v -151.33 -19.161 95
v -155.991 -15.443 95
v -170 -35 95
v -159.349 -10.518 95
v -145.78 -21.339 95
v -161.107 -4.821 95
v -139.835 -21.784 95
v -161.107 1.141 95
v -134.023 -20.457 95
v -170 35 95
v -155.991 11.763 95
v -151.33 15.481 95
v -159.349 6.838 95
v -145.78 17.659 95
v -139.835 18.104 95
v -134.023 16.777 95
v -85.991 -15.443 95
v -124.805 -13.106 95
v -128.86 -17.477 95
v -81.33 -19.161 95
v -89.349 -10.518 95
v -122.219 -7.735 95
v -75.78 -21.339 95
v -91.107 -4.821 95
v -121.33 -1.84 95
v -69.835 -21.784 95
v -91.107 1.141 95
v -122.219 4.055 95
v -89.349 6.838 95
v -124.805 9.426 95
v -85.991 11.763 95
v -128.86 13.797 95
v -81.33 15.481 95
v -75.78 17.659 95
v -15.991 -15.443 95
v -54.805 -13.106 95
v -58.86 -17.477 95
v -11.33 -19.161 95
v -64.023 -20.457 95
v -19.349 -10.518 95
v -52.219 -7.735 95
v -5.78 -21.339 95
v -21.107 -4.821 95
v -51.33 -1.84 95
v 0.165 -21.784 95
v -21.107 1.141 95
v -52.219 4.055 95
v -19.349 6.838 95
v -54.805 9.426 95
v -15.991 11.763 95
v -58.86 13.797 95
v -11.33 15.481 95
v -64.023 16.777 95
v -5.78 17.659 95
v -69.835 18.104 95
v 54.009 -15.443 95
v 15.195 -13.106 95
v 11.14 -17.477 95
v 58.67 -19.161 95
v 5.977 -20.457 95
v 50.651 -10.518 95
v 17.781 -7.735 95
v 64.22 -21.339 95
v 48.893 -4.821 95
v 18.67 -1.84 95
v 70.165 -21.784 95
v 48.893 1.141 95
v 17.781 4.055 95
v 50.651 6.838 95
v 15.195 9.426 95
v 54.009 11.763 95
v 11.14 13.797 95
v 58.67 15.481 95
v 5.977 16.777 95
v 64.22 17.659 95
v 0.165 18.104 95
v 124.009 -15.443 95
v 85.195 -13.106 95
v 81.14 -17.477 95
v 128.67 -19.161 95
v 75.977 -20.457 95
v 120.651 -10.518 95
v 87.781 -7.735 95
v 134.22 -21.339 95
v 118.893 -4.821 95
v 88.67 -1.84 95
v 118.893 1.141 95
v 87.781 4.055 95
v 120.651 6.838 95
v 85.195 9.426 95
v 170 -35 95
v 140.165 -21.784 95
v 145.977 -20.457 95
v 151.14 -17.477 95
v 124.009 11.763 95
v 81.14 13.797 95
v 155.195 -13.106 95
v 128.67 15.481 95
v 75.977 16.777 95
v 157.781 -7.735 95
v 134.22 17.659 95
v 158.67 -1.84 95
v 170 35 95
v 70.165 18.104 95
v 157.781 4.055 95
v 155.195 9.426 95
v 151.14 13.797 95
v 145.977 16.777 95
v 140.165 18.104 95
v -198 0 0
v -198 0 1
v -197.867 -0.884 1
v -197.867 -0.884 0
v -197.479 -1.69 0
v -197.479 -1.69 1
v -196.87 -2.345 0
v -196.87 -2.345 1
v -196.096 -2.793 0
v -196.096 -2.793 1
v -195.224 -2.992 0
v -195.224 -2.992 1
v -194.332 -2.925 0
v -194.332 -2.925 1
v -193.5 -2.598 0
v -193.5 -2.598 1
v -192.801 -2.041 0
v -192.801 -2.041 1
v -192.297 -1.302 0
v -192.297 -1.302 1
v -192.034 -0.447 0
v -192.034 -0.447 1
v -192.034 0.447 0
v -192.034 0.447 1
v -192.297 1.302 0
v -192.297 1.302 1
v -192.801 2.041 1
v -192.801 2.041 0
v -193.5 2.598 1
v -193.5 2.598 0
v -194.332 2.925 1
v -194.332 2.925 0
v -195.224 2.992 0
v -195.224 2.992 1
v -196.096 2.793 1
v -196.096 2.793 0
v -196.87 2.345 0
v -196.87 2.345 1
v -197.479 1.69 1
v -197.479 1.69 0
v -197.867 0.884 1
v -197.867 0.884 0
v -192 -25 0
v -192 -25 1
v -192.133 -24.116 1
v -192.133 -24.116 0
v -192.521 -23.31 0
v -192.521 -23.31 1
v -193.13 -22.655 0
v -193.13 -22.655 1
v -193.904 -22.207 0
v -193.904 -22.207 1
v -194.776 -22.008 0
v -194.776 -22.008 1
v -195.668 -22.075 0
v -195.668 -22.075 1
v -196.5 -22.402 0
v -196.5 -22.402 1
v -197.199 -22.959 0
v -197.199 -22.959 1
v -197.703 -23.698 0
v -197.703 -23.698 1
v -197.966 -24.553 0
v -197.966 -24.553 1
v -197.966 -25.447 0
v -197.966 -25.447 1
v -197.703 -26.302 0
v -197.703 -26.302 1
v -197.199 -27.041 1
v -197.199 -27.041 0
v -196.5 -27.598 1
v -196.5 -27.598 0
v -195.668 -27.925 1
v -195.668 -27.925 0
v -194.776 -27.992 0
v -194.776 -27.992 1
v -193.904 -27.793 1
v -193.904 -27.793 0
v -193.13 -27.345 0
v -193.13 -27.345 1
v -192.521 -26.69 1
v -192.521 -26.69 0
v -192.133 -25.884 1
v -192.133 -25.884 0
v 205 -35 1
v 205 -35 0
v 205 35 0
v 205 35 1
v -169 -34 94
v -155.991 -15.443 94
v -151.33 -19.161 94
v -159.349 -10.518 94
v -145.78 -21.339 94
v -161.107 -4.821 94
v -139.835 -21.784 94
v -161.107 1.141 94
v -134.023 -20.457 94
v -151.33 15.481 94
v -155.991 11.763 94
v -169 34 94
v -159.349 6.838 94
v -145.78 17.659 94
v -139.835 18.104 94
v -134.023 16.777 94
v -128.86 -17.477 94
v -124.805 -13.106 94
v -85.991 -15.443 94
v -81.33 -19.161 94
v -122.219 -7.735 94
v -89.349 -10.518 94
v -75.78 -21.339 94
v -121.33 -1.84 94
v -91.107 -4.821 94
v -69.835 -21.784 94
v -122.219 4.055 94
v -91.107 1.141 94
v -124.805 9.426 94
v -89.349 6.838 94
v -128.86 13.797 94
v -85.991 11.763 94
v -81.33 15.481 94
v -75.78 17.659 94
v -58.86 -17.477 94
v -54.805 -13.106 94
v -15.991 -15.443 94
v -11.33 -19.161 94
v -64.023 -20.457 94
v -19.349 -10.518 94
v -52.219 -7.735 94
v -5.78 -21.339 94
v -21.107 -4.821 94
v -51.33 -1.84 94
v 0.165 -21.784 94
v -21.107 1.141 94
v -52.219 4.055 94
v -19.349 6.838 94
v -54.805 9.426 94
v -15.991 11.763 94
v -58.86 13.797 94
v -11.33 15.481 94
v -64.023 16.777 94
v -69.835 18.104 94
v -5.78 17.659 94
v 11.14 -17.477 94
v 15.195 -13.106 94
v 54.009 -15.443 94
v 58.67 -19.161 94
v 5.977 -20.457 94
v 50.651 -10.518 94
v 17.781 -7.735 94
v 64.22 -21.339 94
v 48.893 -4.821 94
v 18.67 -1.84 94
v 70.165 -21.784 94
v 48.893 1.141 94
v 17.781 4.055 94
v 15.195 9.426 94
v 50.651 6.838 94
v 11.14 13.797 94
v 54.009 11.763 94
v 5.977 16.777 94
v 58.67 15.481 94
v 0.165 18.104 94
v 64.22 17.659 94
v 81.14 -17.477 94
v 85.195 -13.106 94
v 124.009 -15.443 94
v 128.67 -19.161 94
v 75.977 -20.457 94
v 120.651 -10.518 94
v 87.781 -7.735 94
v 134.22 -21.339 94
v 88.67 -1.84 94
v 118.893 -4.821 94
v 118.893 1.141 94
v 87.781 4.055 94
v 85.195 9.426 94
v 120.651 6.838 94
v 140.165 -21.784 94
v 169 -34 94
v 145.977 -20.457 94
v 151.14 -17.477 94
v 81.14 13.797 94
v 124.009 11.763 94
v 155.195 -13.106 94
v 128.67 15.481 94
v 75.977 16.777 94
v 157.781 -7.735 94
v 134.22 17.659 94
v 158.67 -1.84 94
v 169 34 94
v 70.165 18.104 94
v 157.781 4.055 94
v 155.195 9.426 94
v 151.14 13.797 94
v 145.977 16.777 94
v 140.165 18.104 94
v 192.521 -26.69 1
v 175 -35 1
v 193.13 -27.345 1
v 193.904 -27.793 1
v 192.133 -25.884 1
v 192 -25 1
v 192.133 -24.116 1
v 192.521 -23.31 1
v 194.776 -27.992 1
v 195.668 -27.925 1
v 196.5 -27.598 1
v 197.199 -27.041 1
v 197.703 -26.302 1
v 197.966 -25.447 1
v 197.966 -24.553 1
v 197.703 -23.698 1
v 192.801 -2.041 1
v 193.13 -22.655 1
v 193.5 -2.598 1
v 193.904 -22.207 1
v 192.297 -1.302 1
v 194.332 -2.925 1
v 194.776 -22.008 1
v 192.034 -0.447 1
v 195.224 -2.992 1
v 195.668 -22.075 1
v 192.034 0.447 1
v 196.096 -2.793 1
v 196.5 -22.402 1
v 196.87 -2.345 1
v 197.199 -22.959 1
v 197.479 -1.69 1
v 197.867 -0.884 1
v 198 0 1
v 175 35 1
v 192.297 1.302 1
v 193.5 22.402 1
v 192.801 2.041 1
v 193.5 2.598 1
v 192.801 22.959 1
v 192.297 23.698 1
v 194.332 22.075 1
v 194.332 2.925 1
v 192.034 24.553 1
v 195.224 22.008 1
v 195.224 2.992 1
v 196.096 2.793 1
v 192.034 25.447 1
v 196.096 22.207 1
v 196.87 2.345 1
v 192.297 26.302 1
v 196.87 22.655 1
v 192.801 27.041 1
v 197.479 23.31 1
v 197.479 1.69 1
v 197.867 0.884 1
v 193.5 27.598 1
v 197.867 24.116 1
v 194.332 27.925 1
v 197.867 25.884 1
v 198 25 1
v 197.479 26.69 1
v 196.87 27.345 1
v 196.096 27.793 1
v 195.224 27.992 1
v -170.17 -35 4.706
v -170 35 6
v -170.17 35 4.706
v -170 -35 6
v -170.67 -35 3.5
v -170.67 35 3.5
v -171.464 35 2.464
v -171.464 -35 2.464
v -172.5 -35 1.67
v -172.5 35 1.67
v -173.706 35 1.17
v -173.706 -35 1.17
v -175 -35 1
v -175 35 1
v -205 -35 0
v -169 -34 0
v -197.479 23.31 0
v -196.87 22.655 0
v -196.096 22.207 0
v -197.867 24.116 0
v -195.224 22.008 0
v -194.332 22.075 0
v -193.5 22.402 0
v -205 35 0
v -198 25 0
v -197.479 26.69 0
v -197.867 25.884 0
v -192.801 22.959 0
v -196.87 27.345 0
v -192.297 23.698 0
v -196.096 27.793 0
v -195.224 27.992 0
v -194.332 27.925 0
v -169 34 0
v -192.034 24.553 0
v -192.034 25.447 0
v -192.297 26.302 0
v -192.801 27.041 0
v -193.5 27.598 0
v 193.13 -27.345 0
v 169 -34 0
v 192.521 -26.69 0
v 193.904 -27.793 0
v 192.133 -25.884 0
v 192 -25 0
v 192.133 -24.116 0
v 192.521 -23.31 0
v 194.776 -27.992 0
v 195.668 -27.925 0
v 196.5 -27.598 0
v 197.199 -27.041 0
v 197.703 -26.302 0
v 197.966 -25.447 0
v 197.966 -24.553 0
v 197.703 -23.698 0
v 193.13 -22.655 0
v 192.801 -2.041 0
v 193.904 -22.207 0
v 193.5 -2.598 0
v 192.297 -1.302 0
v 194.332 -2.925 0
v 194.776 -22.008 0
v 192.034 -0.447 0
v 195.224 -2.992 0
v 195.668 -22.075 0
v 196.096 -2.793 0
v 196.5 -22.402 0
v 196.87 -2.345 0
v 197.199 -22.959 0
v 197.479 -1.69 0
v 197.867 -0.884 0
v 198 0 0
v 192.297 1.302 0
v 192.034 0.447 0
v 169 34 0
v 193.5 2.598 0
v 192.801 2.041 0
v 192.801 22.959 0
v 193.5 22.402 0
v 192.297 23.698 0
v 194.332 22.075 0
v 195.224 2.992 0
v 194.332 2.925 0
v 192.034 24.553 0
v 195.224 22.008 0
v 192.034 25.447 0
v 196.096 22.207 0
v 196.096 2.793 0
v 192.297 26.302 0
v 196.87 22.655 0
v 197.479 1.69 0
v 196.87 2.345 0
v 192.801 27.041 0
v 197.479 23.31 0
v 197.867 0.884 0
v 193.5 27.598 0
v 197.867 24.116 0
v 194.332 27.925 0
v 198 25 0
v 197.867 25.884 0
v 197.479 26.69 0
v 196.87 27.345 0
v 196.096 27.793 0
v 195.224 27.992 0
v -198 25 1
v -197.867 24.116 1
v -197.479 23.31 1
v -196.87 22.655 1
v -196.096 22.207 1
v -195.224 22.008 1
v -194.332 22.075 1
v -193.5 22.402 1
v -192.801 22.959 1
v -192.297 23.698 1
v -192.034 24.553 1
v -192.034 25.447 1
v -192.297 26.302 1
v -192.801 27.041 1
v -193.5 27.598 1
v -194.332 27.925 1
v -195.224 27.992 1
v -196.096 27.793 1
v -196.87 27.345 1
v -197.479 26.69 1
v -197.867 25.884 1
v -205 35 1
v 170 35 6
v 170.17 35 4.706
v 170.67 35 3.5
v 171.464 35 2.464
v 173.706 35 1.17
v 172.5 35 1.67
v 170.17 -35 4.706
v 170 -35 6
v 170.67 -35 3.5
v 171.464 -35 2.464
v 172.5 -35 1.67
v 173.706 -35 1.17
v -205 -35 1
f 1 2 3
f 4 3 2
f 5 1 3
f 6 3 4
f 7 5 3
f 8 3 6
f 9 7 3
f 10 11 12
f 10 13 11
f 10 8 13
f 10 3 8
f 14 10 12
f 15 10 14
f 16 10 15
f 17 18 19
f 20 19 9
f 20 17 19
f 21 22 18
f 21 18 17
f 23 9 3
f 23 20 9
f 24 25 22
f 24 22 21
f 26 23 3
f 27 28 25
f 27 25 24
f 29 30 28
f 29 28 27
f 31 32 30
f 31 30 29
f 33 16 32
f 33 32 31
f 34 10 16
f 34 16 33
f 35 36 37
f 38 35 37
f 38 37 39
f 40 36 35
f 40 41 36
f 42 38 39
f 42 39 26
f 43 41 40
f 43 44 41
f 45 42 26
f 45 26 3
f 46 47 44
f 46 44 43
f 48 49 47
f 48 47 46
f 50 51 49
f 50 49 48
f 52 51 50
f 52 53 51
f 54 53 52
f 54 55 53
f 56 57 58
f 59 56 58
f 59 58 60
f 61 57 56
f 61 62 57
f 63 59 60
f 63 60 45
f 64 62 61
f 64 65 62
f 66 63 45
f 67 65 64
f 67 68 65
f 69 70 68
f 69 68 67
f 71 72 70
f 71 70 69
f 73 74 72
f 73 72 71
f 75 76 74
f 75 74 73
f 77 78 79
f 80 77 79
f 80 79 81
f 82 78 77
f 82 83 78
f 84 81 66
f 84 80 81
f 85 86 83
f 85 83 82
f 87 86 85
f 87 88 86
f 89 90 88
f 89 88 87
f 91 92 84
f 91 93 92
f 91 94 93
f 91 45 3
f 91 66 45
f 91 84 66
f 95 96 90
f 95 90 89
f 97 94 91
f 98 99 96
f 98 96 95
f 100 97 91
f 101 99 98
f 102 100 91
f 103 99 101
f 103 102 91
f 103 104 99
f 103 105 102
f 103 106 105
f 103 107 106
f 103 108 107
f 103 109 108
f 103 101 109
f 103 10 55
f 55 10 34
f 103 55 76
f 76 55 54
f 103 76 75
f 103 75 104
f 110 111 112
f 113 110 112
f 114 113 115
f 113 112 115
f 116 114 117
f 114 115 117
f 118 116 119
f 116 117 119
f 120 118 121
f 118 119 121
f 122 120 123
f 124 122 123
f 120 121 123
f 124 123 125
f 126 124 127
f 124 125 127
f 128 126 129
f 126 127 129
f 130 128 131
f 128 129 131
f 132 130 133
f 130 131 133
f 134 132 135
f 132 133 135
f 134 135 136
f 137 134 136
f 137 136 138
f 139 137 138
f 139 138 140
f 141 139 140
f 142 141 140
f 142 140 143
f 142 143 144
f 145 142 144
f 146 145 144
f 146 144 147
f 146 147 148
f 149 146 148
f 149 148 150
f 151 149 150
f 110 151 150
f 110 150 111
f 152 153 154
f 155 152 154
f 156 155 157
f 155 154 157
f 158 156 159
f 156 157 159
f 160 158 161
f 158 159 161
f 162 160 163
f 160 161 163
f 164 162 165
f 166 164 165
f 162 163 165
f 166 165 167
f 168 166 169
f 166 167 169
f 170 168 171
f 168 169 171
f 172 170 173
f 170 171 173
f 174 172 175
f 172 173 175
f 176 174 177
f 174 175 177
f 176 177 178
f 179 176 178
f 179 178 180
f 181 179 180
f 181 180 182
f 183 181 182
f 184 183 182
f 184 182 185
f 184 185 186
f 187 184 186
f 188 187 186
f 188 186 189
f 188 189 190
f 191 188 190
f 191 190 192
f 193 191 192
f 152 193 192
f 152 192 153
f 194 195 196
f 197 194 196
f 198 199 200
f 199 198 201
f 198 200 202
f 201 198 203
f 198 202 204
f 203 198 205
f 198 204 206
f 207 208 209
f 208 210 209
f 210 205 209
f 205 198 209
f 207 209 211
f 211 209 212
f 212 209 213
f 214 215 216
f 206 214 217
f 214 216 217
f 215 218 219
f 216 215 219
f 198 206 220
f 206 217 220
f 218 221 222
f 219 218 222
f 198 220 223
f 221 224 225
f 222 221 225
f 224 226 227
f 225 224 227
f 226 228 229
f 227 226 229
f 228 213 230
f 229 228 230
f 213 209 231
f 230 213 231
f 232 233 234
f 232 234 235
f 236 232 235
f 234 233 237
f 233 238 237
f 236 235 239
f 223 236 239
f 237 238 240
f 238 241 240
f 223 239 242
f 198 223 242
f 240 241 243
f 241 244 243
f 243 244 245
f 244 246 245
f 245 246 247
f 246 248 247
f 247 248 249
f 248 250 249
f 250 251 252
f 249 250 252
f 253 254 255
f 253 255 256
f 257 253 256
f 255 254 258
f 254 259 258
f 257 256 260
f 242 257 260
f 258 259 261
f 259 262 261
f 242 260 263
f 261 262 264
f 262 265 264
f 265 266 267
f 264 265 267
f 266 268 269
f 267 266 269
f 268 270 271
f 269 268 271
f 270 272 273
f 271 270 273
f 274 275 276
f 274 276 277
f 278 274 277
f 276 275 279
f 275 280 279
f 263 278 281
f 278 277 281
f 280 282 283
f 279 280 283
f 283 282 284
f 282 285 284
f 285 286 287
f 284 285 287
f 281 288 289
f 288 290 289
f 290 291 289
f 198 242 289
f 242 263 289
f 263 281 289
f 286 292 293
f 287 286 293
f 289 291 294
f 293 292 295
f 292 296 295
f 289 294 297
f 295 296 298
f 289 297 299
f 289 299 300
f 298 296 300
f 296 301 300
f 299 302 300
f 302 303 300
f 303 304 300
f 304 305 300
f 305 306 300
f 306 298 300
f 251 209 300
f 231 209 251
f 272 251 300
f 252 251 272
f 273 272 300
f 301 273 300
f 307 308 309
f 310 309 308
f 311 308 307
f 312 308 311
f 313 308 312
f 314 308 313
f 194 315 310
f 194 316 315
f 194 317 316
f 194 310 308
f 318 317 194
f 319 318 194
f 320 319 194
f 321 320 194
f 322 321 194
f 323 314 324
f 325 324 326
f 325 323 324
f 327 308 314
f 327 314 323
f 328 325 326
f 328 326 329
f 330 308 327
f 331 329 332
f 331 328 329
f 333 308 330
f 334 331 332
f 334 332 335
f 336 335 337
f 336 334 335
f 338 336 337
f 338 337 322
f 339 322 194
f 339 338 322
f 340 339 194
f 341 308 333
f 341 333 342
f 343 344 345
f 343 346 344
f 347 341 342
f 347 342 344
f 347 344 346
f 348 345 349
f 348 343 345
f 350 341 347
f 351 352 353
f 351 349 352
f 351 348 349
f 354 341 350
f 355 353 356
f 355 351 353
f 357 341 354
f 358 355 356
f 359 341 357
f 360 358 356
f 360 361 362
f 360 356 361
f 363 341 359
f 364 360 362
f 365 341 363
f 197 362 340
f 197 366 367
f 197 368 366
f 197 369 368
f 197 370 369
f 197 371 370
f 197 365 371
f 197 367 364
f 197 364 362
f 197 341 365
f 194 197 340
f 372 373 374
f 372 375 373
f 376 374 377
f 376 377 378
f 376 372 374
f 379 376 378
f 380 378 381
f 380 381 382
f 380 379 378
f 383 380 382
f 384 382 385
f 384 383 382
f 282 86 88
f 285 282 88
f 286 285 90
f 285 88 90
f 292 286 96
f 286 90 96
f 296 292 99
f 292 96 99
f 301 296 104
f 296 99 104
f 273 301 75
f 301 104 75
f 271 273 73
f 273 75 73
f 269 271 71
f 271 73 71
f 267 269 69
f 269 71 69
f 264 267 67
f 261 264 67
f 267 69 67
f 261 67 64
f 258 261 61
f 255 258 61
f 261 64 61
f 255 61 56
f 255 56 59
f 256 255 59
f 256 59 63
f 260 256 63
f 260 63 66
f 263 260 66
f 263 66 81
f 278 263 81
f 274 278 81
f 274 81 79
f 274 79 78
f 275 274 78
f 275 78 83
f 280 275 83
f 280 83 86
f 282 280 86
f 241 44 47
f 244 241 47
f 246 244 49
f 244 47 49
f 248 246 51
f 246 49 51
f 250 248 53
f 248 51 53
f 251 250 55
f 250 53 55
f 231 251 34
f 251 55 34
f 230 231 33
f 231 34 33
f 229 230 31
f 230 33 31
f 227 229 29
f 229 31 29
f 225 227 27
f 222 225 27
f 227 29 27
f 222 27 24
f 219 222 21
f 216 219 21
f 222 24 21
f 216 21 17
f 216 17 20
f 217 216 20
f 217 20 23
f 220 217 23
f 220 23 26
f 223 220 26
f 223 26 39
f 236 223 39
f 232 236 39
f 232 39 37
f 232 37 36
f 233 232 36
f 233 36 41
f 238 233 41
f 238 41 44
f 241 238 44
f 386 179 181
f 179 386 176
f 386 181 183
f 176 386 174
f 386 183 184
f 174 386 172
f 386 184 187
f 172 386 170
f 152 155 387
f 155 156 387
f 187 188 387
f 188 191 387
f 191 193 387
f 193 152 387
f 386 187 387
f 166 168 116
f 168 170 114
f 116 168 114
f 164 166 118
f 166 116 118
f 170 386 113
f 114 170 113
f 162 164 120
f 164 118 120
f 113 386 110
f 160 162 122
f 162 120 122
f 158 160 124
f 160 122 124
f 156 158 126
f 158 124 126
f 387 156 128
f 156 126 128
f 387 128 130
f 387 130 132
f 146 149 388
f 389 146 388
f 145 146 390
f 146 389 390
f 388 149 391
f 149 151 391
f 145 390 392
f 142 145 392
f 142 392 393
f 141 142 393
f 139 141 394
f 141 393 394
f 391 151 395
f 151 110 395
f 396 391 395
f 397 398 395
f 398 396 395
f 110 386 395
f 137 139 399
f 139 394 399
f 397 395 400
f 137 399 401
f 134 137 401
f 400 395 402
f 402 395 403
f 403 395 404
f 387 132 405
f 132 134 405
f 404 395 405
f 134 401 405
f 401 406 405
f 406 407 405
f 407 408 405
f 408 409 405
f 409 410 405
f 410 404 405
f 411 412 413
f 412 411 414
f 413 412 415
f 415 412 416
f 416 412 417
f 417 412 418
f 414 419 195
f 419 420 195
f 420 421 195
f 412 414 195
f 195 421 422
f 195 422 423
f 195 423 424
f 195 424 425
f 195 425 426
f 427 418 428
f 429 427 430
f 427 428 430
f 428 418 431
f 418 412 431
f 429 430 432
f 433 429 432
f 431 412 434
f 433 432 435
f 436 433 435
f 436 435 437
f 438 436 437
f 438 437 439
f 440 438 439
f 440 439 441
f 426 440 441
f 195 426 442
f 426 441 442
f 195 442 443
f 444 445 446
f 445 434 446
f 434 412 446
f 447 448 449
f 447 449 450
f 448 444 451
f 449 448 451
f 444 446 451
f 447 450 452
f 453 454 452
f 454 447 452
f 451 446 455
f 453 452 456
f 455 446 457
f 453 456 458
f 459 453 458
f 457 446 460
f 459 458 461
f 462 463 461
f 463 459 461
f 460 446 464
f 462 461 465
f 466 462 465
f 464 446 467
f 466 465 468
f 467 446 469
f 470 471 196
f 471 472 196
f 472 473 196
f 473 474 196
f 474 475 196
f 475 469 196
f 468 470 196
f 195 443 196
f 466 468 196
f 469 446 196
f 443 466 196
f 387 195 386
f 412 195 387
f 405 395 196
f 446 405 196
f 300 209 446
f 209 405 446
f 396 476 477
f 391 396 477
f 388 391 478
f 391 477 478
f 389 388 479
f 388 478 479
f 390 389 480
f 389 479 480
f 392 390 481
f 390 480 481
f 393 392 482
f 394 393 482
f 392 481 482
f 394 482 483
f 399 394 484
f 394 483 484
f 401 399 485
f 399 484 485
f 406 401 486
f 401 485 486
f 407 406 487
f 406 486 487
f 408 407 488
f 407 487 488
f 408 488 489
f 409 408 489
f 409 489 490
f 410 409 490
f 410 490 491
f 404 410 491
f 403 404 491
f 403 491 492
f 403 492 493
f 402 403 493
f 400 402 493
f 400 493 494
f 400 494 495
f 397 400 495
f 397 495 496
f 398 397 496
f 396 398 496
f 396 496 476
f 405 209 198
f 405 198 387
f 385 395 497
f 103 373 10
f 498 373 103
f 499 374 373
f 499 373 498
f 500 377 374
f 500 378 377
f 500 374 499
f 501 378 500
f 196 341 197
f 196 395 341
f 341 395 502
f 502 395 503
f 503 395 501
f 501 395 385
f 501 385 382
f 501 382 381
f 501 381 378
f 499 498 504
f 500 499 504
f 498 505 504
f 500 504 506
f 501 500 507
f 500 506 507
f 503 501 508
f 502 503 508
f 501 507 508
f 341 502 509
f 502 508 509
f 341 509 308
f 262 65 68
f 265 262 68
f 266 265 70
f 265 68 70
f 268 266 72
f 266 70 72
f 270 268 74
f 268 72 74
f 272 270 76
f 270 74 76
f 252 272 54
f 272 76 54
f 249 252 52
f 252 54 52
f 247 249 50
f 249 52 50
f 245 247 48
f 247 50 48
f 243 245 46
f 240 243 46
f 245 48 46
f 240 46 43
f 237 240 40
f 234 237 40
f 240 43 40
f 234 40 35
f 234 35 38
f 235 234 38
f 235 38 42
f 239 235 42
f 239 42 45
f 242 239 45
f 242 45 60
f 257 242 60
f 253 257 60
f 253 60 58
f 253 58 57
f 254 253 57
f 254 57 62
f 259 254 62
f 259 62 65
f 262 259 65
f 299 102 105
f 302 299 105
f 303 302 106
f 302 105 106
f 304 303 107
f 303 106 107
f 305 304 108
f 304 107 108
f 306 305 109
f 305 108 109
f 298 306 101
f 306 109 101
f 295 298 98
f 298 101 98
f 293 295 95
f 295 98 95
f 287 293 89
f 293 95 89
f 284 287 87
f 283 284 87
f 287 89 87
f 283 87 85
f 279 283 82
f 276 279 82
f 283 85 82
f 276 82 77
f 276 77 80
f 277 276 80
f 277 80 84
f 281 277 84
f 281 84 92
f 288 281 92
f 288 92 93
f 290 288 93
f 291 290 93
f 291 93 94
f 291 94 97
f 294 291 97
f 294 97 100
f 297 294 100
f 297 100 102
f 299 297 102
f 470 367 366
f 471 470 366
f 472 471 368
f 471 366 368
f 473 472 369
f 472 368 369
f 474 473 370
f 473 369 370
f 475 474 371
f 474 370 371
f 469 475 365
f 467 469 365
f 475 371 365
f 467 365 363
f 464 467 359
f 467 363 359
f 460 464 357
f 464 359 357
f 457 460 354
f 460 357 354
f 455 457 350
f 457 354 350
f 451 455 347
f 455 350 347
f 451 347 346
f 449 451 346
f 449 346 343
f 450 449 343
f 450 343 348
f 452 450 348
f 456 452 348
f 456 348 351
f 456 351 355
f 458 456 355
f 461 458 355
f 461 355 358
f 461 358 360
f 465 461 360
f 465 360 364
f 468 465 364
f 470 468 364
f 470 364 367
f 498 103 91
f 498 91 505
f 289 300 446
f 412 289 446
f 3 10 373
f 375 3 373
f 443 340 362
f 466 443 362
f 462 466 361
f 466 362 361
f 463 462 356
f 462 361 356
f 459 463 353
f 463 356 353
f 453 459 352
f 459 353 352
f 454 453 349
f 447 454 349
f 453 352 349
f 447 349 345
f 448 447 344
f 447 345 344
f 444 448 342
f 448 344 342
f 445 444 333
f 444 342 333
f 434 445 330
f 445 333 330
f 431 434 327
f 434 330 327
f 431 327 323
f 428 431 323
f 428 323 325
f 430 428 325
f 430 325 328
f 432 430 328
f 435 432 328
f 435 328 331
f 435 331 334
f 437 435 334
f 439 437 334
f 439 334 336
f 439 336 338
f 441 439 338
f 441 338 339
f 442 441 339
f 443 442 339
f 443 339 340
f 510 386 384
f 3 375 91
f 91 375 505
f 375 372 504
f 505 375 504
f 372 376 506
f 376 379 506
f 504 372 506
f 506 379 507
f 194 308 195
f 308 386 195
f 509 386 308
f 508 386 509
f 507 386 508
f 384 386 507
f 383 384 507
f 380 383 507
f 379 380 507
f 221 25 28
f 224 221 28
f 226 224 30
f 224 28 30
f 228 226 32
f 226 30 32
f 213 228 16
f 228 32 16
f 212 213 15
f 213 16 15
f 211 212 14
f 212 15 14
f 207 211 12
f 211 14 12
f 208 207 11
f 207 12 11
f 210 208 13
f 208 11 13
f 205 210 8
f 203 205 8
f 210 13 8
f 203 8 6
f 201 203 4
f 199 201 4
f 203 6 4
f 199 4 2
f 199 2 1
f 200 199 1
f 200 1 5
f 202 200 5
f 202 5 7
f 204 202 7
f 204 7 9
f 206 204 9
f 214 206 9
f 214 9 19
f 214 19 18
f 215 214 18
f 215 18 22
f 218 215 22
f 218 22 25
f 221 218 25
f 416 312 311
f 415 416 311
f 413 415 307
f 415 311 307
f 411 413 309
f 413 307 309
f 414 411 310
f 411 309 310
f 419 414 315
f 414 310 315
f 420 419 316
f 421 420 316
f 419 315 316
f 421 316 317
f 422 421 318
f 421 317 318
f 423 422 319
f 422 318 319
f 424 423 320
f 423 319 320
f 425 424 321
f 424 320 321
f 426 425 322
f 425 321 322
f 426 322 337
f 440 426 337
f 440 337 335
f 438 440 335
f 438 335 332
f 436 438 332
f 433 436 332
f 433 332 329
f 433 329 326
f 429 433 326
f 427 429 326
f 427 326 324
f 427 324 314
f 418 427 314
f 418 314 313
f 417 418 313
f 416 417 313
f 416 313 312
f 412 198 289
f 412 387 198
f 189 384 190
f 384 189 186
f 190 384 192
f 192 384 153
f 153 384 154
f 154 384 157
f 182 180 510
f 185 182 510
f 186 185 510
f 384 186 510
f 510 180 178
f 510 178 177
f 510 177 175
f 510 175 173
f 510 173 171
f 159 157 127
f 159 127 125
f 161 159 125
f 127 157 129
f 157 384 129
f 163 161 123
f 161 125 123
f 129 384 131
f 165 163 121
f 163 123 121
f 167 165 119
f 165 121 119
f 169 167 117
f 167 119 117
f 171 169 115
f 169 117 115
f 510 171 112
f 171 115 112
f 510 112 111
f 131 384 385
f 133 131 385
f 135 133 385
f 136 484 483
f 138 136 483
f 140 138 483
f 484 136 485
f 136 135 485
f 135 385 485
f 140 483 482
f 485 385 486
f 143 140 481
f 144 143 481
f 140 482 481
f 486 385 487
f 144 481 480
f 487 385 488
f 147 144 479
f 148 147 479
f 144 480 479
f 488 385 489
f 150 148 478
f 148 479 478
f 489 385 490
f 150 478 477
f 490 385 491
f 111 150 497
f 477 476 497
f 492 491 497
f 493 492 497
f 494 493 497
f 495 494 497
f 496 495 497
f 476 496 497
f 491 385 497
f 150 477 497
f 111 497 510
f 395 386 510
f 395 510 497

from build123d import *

# Parameters (mm, degrees)
SKETCH_1_W          = 410
SKETCH_1_H          = 70
EXTRUDE_1_DEPTH     = 95
SKETCH_2_W          = 35
SKETCH_2_H          = 94
CUT_EXTRUDE_1_DEPTH = 95
SHELL_1_T           = -1
FILLET_2_R          = 5
SKETCH_3_R          = 2.9999999999999947
SKETCH_3_R_2        = 2.999999999999994
SKETCH_3_R_3        = 3.000000000000047
CUT_EXTRUDE_2_DEPTH = 229.22357459298556
SKETCH_4_R          = 20.000000000000004
SKETCH_4_R_2        = 20
SKETCH_4_R_3        = 19.999999999999986
CUT_EXTRUDE_3_DEPTH = 229.63726730347355


with BuildPart() as part:
    # 草图1 → 凸台-拉伸1 (new body)
    with BuildSketch(Plane.XY):
        Rectangle(SKETCH_1_W, SKETCH_1_H)
    extrude(amount=EXTRUDE_1_DEPTH)

    # 草图2 → 切除-拉伸1 (cut)
    with BuildSketch(Plane(origin=(0, 34.99999999999999, 0), x_dir=(1, 0, 0), z_dir=(0, 1, 0))):
        with Locations((187.49999999999997, -48)):
            Rectangle(SKETCH_2_W, SKETCH_2_H)
        Polygon((-204.99999999999997, -1.0000000000001206), (-204.99999999999991, -95.00000000000011), (-169.99999999999994, -95.00000000000011), (-169.99999999999997, -1.0000000000001001), align=None)
    extrude(amount=-CUT_EXTRUDE_1_DEPTH, mode=Mode.SUBTRACT)

    # 抽壳1
    shell_1_openings = [part.faces().sort_by_distance(p)[0] for p in [
        (0, 0, 0),
    ]]
    offset(amount=SHELL_1_T, openings=shell_1_openings, kind=Kind.INTERSECTION)

    # 圆角2
    fillet_2_edges = [part.edges().sort_by_distance(p)[0] for p in [
        (169.99999999999997, -7.11e-15, 1.0000000000000009),
        (-169.99999999999997, -7.11e-15, 1.0000000000001001),
    ]]
    fillet(fillet_2_edges, radius=FILLET_2_R)

    # 草图3 → 切除-拉伸2 (cut, through all)
    with BuildSketch(Plane.XY.offset(1.000000000000001)):
        with Locations((194.99999999999994, 24.999999999999993)):
            Circle(SKETCH_3_R)
        with Locations(Location((194.99999999999994, -25.000000000000007, 0), (0, 0, 180))):
            Circle(SKETCH_3_R)
        with Locations((194.99999999999994, -6.94e-15)):
            Circle(SKETCH_3_R_2)
        with Locations(Location((-194.9999999999999, -1.5959e-13, 0), (0, 0, 180))):
            Circle(SKETCH_3_R_3)
        with Locations(Location((-194.99999999999994, 24.999999999999837, 0), (0, 0, 180))):
            Circle(SKETCH_3_R)
        with Locations((-194.9999999999999, -25.00000000000016)):
            Circle(SKETCH_3_R)
    extrude(amount=-CUT_EXTRUDE_2_DEPTH, mode=Mode.SUBTRACT)

    # 草图4 → 切除-拉伸3 (cut, through all)
    with BuildSketch(Plane.XY.offset(95)):
        with Locations((-141.32999999999993, -1.8400000000000152)):
            Circle(SKETCH_4_R)
        with Locations((-71.32999999999993, -1.8400000000000152)):
            Circle(SKETCH_4_R)
        with Locations((-1.3299999999999146, -1.8400000000000152)):
            Circle(SKETCH_4_R_2)
        with Locations((68.67000000000009, -1.8400000000000152)):
            Circle(SKETCH_4_R)
        with Locations((138.6700000000001, -1.8400000000000152)):
            Circle(SKETCH_4_R_3)
    extrude(amount=-CUT_EXTRUDE_3_DEPTH, mode=Mode.SUBTRACT)


solid = part.part
